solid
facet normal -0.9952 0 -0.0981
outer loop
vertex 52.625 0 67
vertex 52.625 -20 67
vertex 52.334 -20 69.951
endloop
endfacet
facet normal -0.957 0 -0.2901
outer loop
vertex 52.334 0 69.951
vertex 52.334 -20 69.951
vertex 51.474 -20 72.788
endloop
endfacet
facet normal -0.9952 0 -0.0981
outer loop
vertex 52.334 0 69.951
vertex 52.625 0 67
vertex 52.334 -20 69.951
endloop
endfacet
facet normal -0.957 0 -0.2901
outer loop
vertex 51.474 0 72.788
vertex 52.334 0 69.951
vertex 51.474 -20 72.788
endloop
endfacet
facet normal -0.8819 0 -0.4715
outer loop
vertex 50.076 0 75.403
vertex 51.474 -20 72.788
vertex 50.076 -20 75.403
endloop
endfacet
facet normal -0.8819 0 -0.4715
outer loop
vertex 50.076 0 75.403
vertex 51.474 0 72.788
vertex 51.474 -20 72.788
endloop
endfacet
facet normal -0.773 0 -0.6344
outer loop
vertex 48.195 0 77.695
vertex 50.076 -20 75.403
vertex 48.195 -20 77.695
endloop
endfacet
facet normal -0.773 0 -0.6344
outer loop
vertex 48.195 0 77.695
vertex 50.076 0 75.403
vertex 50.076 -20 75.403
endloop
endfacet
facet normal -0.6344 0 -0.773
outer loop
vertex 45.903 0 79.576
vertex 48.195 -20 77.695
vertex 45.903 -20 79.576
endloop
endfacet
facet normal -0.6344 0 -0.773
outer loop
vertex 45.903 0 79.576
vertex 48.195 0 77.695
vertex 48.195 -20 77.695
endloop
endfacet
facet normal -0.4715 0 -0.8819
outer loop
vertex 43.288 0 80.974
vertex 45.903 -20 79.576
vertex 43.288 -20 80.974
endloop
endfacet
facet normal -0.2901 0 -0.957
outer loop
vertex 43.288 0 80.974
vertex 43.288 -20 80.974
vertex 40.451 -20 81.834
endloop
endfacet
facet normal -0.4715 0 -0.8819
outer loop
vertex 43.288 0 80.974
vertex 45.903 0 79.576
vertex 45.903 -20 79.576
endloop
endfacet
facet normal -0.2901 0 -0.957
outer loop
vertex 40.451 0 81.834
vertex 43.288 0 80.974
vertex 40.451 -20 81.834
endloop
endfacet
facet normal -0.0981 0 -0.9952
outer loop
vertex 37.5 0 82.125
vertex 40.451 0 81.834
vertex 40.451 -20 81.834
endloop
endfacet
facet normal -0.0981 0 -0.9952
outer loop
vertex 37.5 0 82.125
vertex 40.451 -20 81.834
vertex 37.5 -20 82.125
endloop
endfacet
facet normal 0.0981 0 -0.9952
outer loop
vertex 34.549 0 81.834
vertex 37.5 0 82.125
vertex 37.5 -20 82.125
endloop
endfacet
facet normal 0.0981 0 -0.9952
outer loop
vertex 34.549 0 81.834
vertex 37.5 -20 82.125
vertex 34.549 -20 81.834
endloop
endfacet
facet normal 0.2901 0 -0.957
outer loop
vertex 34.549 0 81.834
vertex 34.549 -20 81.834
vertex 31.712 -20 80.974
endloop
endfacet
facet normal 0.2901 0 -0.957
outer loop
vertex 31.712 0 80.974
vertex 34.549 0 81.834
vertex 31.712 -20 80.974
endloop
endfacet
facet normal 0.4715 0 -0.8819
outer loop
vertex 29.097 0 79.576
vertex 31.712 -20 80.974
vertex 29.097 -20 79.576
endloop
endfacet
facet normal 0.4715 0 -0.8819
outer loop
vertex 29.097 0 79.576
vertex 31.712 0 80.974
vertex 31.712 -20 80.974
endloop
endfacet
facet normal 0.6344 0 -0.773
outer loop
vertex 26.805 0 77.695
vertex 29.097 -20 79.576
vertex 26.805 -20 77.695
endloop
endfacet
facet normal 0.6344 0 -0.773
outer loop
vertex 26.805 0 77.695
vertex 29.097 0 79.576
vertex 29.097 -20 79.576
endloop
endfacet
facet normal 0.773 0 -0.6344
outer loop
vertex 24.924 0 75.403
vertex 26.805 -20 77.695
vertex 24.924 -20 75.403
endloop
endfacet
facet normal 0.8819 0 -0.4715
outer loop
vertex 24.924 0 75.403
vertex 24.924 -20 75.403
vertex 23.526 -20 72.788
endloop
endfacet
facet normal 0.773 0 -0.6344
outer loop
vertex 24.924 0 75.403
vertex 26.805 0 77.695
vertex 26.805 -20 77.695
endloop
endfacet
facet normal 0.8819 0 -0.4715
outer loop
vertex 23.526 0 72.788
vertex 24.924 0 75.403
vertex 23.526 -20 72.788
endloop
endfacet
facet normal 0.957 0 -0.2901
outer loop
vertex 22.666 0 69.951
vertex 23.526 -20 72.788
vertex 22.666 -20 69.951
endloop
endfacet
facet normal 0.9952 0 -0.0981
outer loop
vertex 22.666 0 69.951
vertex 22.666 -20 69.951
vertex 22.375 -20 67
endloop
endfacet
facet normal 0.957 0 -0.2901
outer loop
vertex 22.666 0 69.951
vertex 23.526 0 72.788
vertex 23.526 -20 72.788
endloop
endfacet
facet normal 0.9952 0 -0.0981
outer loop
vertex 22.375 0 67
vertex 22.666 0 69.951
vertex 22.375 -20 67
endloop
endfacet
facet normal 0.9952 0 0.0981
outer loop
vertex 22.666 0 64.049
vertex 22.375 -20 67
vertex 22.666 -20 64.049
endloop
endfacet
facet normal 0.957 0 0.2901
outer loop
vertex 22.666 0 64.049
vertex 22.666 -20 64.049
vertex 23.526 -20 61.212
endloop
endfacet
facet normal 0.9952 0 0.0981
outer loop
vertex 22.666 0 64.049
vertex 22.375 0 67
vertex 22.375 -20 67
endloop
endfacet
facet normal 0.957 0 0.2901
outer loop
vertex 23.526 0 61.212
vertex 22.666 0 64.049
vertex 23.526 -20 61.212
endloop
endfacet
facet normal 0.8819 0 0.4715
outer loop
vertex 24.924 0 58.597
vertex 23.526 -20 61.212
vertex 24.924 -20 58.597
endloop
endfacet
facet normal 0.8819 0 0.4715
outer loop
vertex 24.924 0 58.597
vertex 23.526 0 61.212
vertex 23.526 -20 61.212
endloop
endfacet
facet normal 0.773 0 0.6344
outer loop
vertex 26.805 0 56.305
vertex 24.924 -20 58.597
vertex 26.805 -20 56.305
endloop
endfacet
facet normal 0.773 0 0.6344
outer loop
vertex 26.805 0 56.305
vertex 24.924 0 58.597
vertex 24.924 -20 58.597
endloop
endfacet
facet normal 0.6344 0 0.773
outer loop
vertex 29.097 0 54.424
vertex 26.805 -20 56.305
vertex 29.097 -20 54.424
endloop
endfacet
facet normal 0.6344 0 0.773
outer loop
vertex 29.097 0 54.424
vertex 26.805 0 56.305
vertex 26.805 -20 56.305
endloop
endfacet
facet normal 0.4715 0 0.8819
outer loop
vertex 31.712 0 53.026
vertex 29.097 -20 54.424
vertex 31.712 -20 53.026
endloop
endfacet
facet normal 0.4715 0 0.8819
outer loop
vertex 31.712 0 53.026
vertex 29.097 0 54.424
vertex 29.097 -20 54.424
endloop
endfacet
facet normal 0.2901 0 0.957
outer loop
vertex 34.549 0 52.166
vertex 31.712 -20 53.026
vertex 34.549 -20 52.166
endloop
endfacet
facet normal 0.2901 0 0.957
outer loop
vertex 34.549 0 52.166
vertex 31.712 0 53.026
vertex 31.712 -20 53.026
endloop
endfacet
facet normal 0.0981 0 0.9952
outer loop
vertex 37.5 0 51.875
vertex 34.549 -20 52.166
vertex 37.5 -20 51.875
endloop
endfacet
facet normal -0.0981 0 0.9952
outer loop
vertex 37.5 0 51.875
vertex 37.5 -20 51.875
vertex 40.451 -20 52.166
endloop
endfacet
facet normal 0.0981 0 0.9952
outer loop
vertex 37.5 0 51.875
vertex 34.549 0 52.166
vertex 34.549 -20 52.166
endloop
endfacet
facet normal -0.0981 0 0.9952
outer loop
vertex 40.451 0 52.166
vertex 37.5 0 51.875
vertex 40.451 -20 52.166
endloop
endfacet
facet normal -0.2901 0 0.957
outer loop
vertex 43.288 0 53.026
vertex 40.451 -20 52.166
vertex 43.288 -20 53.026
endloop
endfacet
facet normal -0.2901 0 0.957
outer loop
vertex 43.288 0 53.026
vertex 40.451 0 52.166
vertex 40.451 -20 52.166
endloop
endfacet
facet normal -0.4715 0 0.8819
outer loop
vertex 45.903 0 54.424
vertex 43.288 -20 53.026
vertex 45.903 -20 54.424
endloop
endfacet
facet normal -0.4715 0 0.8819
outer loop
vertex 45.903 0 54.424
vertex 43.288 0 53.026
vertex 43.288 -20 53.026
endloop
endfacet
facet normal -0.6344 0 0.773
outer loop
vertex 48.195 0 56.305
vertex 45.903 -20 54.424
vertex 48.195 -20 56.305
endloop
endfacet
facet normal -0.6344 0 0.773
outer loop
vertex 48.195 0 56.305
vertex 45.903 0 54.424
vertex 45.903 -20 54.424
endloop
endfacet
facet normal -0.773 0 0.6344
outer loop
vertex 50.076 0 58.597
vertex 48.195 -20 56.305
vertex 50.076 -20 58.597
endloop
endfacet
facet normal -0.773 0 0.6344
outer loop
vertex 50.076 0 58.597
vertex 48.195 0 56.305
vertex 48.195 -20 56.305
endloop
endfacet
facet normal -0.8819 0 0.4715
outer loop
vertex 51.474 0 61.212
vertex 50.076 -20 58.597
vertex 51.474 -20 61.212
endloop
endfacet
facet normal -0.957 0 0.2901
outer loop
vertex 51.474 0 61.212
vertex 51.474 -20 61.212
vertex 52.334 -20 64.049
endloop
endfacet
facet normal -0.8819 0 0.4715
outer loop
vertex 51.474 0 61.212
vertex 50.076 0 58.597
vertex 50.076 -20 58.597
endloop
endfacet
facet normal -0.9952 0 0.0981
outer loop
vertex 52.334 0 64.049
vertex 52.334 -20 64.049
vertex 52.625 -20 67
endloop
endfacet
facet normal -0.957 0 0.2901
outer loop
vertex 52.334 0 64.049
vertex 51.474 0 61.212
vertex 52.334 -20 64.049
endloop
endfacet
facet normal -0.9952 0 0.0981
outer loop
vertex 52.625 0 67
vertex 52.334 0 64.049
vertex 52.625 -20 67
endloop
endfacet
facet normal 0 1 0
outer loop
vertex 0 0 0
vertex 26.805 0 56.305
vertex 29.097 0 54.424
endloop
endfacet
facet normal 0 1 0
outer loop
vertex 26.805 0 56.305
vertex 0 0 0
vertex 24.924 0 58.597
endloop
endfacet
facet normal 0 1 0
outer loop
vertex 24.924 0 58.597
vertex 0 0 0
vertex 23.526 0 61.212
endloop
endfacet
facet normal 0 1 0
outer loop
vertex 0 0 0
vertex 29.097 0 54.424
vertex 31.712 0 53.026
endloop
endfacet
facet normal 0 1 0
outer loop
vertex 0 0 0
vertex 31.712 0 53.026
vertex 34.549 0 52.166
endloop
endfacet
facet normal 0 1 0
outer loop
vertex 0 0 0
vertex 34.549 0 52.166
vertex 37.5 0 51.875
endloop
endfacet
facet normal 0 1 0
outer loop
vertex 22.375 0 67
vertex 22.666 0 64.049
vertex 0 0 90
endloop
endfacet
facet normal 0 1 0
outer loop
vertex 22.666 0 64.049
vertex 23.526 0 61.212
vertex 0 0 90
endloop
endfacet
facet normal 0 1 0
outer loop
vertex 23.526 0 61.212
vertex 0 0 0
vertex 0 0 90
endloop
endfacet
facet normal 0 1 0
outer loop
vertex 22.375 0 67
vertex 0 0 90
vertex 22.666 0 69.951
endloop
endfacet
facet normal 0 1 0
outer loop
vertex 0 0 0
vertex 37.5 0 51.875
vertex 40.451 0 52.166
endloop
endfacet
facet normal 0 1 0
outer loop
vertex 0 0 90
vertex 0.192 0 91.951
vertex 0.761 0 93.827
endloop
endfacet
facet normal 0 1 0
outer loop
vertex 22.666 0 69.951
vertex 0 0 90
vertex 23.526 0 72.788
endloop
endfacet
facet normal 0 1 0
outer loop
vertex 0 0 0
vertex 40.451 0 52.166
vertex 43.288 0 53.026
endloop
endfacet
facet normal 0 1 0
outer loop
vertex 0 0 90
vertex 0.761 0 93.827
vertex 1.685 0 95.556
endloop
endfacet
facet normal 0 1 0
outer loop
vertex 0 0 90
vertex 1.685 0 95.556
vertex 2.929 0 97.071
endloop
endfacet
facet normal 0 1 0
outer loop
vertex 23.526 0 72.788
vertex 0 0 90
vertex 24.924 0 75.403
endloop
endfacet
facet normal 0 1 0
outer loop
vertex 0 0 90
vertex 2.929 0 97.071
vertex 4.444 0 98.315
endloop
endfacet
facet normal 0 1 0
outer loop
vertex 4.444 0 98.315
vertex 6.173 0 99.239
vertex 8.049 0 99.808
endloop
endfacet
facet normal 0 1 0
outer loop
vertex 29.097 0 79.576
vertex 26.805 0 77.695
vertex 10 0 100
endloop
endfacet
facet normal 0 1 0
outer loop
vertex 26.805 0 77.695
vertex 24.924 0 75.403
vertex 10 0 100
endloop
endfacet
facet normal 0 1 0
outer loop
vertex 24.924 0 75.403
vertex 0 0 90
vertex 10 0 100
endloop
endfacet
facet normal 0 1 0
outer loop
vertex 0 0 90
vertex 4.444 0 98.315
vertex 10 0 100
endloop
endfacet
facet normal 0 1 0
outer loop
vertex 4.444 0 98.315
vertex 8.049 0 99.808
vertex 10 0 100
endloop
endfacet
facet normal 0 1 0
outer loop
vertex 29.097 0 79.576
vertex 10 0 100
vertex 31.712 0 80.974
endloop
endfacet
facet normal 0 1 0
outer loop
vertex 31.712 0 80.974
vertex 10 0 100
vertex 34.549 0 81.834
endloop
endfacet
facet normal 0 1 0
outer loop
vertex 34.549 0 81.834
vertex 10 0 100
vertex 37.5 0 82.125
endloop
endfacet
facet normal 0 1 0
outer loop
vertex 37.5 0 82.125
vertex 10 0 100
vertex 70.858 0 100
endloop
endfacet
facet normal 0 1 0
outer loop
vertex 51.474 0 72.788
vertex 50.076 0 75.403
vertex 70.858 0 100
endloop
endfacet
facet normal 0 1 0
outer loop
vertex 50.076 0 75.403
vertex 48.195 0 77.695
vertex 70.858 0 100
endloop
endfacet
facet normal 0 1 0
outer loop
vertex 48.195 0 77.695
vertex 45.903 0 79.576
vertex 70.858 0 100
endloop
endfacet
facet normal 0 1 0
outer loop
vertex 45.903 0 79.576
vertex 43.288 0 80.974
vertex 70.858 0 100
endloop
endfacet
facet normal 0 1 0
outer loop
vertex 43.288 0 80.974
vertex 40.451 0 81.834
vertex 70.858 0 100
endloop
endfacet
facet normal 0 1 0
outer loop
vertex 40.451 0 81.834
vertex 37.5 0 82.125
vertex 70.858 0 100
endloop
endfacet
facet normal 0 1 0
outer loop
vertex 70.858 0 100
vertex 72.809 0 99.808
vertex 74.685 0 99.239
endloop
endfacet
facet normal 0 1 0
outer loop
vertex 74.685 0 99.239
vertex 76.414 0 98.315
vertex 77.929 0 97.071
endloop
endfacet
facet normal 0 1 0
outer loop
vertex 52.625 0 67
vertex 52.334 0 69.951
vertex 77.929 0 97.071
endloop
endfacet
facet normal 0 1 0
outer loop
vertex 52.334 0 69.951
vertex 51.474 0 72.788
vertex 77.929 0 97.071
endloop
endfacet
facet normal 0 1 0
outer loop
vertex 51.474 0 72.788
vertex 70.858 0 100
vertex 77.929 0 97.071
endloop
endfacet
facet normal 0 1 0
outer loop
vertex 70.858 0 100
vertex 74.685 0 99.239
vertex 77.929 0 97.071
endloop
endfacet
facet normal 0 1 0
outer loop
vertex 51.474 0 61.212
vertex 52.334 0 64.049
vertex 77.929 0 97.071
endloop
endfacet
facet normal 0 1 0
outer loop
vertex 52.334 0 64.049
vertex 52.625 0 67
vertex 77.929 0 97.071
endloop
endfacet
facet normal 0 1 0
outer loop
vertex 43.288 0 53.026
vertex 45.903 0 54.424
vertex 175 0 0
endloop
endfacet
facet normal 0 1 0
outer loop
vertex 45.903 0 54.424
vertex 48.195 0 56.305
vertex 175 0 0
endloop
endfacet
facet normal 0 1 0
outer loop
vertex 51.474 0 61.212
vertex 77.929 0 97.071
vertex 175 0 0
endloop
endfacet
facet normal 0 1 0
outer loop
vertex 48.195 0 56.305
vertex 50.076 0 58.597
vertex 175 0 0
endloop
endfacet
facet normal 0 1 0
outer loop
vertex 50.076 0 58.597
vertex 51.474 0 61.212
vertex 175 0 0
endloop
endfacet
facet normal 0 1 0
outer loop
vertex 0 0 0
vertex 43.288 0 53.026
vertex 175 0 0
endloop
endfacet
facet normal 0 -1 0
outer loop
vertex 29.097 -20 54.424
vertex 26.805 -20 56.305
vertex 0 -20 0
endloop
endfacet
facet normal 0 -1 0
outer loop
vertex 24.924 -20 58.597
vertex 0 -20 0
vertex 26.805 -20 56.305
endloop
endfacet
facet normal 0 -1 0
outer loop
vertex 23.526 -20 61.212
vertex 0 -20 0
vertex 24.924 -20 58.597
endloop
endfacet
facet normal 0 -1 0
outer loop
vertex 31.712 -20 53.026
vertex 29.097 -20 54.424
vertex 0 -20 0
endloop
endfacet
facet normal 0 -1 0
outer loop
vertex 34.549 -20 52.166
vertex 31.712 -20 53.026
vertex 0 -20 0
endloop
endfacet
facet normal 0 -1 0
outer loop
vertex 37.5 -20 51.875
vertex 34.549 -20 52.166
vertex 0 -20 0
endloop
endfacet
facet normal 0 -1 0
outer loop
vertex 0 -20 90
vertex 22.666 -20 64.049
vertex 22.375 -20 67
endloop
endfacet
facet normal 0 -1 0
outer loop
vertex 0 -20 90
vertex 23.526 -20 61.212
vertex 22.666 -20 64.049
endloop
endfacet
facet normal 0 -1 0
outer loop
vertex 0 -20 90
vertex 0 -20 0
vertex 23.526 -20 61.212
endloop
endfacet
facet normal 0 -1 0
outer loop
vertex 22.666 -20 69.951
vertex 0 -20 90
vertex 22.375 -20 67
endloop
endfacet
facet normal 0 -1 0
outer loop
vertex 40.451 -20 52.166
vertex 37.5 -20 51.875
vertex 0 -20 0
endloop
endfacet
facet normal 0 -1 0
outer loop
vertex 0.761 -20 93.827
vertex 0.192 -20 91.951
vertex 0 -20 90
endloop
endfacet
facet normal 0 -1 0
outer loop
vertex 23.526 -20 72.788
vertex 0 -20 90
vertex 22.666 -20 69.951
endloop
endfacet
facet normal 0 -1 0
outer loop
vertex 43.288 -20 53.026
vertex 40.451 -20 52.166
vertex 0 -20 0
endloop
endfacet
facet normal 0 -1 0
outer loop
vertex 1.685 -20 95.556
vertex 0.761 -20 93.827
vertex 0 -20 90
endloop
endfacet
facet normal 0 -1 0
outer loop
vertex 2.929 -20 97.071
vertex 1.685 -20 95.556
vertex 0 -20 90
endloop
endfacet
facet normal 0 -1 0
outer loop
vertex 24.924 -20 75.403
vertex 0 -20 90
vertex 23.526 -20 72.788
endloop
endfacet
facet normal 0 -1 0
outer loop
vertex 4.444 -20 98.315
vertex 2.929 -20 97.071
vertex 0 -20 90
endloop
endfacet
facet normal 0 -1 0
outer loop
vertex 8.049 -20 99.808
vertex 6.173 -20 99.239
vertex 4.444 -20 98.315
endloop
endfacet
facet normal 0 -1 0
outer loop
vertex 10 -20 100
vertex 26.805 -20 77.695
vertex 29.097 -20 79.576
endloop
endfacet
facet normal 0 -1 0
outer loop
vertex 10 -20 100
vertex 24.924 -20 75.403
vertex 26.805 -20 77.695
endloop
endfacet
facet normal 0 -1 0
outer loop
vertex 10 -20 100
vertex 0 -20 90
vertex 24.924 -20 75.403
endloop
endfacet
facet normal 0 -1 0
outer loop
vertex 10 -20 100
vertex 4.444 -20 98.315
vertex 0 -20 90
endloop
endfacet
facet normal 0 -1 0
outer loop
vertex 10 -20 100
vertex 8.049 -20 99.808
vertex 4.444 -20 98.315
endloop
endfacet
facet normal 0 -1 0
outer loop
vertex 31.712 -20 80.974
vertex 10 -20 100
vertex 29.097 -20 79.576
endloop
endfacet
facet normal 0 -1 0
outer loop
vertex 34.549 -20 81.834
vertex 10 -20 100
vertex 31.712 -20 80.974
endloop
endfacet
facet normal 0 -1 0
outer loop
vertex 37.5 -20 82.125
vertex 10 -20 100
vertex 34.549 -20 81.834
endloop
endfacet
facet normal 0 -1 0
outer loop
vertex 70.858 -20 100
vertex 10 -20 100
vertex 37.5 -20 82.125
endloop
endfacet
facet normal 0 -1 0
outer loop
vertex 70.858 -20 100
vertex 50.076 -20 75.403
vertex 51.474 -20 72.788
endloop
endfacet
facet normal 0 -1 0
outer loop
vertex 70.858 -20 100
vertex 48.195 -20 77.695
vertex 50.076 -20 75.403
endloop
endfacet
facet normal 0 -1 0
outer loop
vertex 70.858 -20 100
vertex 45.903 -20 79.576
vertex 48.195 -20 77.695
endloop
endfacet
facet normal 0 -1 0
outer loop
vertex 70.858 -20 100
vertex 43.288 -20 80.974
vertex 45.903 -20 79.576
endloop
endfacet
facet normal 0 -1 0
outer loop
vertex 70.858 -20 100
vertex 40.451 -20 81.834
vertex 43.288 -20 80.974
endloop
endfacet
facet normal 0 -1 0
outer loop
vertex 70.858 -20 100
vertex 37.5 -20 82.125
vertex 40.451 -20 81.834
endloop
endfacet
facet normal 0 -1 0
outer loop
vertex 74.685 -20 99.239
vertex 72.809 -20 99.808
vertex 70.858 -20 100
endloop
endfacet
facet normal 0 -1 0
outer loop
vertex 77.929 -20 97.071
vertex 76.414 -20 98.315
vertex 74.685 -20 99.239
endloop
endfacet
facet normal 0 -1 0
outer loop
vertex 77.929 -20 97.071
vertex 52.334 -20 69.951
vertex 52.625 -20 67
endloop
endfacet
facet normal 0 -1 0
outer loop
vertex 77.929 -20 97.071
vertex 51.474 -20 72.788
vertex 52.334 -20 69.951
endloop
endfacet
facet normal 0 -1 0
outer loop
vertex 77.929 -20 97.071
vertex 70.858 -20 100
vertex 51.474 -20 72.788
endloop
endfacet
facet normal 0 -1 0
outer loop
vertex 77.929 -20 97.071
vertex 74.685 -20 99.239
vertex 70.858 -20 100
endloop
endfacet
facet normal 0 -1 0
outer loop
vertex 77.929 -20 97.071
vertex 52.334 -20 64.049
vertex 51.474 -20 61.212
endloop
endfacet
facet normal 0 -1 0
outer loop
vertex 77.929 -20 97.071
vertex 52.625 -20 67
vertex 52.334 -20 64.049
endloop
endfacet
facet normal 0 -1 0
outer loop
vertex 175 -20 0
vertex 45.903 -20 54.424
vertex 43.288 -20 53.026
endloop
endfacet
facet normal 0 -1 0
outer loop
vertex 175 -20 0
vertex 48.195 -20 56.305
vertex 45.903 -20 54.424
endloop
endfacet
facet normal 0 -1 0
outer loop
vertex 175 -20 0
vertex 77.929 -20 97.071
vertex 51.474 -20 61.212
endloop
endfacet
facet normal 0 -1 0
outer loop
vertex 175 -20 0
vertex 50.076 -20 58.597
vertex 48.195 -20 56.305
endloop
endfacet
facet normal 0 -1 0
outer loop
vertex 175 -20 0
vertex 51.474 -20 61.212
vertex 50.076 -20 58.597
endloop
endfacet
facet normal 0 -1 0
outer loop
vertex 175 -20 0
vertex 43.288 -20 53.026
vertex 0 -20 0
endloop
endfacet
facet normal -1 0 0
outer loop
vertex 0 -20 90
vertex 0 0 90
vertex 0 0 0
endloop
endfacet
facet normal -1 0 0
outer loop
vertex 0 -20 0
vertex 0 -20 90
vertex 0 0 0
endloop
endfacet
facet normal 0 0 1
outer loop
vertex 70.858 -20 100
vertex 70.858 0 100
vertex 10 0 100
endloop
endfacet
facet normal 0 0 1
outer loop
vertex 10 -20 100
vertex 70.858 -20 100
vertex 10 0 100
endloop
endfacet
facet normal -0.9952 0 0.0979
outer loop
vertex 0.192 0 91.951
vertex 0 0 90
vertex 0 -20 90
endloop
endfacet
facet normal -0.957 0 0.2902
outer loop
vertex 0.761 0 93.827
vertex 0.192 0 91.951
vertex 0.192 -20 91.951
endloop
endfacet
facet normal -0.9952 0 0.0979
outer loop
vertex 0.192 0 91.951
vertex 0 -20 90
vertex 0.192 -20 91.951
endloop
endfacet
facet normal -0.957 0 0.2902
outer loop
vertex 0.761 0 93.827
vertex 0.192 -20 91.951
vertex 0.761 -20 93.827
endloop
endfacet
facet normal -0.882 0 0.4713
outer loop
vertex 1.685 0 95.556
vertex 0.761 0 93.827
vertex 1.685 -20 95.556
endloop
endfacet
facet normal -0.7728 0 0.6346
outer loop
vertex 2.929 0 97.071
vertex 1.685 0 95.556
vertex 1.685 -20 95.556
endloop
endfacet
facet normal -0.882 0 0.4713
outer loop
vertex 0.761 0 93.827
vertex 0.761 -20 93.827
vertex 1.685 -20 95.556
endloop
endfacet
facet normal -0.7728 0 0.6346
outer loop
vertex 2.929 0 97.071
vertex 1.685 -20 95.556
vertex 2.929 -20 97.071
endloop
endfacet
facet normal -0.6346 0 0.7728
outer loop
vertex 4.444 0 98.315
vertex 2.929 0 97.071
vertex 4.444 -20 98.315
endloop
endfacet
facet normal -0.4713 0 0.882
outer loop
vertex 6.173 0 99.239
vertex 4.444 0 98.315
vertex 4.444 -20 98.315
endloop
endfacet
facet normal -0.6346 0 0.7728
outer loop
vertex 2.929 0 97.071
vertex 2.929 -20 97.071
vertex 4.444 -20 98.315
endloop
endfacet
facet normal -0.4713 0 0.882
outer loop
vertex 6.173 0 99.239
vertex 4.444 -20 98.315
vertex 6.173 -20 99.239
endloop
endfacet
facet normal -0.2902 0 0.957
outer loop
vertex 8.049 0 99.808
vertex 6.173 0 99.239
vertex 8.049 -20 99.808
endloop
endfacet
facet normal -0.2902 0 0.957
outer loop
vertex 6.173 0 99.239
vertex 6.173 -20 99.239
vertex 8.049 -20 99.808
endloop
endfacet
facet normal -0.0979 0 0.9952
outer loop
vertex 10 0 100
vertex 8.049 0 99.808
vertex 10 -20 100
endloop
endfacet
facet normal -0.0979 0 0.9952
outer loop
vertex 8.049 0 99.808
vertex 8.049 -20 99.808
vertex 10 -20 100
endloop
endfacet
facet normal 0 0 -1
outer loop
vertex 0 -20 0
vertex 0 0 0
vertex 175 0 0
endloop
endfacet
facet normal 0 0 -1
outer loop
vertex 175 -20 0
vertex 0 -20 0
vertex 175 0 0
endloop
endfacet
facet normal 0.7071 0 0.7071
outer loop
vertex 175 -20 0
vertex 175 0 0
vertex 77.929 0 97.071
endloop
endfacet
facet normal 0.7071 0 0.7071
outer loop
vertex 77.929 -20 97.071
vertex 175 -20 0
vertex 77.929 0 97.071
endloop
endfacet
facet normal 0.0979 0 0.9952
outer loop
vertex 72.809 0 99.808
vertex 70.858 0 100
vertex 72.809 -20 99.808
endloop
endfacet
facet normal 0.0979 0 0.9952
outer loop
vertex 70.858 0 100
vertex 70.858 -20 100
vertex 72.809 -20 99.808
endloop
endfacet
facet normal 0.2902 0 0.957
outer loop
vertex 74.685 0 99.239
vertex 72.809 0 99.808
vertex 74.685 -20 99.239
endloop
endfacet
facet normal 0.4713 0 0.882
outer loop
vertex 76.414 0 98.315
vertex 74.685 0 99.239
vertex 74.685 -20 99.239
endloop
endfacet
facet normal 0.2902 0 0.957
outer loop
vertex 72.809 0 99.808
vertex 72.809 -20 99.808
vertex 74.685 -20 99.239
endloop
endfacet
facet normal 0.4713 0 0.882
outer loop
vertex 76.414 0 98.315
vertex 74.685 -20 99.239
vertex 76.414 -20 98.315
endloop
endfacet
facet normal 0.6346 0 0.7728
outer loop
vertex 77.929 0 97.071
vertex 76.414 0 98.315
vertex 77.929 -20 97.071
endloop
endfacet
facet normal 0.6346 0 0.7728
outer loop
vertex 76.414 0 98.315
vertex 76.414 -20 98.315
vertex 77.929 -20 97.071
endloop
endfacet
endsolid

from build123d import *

# Parameters (mm, degrees)
F0_R     = 15.125
F1_DEPTH = 20
F2_R     = 10
F3_R     = 10


with BuildPart() as f1:
    # F0 (on Front) → F1 (new body)
    with BuildSketch(Plane.XZ):
        Polygon((0, 100), (0, 0), (150, 0), (175, 0), (75, 100), align=None)
        with Locations((37.5, 67)):
            Circle(F0_R, mode=Mode.SUBTRACT)
    extrude(amount=F1_DEPTH)

    # F2
    f2_edges = [f1.edges().sort_by_distance(p)[0] for p in [
        (0, -10, 100),
    ]]
    fillet(f2_edges, radius=F2_R)

    # F3
    f3_edges = [f1.edges().sort_by_distance(p)[0] for p in [
        (75, -10, 100),
    ]]
    fillet(f3_edges, radius=F3_R)


solid = f1.part
